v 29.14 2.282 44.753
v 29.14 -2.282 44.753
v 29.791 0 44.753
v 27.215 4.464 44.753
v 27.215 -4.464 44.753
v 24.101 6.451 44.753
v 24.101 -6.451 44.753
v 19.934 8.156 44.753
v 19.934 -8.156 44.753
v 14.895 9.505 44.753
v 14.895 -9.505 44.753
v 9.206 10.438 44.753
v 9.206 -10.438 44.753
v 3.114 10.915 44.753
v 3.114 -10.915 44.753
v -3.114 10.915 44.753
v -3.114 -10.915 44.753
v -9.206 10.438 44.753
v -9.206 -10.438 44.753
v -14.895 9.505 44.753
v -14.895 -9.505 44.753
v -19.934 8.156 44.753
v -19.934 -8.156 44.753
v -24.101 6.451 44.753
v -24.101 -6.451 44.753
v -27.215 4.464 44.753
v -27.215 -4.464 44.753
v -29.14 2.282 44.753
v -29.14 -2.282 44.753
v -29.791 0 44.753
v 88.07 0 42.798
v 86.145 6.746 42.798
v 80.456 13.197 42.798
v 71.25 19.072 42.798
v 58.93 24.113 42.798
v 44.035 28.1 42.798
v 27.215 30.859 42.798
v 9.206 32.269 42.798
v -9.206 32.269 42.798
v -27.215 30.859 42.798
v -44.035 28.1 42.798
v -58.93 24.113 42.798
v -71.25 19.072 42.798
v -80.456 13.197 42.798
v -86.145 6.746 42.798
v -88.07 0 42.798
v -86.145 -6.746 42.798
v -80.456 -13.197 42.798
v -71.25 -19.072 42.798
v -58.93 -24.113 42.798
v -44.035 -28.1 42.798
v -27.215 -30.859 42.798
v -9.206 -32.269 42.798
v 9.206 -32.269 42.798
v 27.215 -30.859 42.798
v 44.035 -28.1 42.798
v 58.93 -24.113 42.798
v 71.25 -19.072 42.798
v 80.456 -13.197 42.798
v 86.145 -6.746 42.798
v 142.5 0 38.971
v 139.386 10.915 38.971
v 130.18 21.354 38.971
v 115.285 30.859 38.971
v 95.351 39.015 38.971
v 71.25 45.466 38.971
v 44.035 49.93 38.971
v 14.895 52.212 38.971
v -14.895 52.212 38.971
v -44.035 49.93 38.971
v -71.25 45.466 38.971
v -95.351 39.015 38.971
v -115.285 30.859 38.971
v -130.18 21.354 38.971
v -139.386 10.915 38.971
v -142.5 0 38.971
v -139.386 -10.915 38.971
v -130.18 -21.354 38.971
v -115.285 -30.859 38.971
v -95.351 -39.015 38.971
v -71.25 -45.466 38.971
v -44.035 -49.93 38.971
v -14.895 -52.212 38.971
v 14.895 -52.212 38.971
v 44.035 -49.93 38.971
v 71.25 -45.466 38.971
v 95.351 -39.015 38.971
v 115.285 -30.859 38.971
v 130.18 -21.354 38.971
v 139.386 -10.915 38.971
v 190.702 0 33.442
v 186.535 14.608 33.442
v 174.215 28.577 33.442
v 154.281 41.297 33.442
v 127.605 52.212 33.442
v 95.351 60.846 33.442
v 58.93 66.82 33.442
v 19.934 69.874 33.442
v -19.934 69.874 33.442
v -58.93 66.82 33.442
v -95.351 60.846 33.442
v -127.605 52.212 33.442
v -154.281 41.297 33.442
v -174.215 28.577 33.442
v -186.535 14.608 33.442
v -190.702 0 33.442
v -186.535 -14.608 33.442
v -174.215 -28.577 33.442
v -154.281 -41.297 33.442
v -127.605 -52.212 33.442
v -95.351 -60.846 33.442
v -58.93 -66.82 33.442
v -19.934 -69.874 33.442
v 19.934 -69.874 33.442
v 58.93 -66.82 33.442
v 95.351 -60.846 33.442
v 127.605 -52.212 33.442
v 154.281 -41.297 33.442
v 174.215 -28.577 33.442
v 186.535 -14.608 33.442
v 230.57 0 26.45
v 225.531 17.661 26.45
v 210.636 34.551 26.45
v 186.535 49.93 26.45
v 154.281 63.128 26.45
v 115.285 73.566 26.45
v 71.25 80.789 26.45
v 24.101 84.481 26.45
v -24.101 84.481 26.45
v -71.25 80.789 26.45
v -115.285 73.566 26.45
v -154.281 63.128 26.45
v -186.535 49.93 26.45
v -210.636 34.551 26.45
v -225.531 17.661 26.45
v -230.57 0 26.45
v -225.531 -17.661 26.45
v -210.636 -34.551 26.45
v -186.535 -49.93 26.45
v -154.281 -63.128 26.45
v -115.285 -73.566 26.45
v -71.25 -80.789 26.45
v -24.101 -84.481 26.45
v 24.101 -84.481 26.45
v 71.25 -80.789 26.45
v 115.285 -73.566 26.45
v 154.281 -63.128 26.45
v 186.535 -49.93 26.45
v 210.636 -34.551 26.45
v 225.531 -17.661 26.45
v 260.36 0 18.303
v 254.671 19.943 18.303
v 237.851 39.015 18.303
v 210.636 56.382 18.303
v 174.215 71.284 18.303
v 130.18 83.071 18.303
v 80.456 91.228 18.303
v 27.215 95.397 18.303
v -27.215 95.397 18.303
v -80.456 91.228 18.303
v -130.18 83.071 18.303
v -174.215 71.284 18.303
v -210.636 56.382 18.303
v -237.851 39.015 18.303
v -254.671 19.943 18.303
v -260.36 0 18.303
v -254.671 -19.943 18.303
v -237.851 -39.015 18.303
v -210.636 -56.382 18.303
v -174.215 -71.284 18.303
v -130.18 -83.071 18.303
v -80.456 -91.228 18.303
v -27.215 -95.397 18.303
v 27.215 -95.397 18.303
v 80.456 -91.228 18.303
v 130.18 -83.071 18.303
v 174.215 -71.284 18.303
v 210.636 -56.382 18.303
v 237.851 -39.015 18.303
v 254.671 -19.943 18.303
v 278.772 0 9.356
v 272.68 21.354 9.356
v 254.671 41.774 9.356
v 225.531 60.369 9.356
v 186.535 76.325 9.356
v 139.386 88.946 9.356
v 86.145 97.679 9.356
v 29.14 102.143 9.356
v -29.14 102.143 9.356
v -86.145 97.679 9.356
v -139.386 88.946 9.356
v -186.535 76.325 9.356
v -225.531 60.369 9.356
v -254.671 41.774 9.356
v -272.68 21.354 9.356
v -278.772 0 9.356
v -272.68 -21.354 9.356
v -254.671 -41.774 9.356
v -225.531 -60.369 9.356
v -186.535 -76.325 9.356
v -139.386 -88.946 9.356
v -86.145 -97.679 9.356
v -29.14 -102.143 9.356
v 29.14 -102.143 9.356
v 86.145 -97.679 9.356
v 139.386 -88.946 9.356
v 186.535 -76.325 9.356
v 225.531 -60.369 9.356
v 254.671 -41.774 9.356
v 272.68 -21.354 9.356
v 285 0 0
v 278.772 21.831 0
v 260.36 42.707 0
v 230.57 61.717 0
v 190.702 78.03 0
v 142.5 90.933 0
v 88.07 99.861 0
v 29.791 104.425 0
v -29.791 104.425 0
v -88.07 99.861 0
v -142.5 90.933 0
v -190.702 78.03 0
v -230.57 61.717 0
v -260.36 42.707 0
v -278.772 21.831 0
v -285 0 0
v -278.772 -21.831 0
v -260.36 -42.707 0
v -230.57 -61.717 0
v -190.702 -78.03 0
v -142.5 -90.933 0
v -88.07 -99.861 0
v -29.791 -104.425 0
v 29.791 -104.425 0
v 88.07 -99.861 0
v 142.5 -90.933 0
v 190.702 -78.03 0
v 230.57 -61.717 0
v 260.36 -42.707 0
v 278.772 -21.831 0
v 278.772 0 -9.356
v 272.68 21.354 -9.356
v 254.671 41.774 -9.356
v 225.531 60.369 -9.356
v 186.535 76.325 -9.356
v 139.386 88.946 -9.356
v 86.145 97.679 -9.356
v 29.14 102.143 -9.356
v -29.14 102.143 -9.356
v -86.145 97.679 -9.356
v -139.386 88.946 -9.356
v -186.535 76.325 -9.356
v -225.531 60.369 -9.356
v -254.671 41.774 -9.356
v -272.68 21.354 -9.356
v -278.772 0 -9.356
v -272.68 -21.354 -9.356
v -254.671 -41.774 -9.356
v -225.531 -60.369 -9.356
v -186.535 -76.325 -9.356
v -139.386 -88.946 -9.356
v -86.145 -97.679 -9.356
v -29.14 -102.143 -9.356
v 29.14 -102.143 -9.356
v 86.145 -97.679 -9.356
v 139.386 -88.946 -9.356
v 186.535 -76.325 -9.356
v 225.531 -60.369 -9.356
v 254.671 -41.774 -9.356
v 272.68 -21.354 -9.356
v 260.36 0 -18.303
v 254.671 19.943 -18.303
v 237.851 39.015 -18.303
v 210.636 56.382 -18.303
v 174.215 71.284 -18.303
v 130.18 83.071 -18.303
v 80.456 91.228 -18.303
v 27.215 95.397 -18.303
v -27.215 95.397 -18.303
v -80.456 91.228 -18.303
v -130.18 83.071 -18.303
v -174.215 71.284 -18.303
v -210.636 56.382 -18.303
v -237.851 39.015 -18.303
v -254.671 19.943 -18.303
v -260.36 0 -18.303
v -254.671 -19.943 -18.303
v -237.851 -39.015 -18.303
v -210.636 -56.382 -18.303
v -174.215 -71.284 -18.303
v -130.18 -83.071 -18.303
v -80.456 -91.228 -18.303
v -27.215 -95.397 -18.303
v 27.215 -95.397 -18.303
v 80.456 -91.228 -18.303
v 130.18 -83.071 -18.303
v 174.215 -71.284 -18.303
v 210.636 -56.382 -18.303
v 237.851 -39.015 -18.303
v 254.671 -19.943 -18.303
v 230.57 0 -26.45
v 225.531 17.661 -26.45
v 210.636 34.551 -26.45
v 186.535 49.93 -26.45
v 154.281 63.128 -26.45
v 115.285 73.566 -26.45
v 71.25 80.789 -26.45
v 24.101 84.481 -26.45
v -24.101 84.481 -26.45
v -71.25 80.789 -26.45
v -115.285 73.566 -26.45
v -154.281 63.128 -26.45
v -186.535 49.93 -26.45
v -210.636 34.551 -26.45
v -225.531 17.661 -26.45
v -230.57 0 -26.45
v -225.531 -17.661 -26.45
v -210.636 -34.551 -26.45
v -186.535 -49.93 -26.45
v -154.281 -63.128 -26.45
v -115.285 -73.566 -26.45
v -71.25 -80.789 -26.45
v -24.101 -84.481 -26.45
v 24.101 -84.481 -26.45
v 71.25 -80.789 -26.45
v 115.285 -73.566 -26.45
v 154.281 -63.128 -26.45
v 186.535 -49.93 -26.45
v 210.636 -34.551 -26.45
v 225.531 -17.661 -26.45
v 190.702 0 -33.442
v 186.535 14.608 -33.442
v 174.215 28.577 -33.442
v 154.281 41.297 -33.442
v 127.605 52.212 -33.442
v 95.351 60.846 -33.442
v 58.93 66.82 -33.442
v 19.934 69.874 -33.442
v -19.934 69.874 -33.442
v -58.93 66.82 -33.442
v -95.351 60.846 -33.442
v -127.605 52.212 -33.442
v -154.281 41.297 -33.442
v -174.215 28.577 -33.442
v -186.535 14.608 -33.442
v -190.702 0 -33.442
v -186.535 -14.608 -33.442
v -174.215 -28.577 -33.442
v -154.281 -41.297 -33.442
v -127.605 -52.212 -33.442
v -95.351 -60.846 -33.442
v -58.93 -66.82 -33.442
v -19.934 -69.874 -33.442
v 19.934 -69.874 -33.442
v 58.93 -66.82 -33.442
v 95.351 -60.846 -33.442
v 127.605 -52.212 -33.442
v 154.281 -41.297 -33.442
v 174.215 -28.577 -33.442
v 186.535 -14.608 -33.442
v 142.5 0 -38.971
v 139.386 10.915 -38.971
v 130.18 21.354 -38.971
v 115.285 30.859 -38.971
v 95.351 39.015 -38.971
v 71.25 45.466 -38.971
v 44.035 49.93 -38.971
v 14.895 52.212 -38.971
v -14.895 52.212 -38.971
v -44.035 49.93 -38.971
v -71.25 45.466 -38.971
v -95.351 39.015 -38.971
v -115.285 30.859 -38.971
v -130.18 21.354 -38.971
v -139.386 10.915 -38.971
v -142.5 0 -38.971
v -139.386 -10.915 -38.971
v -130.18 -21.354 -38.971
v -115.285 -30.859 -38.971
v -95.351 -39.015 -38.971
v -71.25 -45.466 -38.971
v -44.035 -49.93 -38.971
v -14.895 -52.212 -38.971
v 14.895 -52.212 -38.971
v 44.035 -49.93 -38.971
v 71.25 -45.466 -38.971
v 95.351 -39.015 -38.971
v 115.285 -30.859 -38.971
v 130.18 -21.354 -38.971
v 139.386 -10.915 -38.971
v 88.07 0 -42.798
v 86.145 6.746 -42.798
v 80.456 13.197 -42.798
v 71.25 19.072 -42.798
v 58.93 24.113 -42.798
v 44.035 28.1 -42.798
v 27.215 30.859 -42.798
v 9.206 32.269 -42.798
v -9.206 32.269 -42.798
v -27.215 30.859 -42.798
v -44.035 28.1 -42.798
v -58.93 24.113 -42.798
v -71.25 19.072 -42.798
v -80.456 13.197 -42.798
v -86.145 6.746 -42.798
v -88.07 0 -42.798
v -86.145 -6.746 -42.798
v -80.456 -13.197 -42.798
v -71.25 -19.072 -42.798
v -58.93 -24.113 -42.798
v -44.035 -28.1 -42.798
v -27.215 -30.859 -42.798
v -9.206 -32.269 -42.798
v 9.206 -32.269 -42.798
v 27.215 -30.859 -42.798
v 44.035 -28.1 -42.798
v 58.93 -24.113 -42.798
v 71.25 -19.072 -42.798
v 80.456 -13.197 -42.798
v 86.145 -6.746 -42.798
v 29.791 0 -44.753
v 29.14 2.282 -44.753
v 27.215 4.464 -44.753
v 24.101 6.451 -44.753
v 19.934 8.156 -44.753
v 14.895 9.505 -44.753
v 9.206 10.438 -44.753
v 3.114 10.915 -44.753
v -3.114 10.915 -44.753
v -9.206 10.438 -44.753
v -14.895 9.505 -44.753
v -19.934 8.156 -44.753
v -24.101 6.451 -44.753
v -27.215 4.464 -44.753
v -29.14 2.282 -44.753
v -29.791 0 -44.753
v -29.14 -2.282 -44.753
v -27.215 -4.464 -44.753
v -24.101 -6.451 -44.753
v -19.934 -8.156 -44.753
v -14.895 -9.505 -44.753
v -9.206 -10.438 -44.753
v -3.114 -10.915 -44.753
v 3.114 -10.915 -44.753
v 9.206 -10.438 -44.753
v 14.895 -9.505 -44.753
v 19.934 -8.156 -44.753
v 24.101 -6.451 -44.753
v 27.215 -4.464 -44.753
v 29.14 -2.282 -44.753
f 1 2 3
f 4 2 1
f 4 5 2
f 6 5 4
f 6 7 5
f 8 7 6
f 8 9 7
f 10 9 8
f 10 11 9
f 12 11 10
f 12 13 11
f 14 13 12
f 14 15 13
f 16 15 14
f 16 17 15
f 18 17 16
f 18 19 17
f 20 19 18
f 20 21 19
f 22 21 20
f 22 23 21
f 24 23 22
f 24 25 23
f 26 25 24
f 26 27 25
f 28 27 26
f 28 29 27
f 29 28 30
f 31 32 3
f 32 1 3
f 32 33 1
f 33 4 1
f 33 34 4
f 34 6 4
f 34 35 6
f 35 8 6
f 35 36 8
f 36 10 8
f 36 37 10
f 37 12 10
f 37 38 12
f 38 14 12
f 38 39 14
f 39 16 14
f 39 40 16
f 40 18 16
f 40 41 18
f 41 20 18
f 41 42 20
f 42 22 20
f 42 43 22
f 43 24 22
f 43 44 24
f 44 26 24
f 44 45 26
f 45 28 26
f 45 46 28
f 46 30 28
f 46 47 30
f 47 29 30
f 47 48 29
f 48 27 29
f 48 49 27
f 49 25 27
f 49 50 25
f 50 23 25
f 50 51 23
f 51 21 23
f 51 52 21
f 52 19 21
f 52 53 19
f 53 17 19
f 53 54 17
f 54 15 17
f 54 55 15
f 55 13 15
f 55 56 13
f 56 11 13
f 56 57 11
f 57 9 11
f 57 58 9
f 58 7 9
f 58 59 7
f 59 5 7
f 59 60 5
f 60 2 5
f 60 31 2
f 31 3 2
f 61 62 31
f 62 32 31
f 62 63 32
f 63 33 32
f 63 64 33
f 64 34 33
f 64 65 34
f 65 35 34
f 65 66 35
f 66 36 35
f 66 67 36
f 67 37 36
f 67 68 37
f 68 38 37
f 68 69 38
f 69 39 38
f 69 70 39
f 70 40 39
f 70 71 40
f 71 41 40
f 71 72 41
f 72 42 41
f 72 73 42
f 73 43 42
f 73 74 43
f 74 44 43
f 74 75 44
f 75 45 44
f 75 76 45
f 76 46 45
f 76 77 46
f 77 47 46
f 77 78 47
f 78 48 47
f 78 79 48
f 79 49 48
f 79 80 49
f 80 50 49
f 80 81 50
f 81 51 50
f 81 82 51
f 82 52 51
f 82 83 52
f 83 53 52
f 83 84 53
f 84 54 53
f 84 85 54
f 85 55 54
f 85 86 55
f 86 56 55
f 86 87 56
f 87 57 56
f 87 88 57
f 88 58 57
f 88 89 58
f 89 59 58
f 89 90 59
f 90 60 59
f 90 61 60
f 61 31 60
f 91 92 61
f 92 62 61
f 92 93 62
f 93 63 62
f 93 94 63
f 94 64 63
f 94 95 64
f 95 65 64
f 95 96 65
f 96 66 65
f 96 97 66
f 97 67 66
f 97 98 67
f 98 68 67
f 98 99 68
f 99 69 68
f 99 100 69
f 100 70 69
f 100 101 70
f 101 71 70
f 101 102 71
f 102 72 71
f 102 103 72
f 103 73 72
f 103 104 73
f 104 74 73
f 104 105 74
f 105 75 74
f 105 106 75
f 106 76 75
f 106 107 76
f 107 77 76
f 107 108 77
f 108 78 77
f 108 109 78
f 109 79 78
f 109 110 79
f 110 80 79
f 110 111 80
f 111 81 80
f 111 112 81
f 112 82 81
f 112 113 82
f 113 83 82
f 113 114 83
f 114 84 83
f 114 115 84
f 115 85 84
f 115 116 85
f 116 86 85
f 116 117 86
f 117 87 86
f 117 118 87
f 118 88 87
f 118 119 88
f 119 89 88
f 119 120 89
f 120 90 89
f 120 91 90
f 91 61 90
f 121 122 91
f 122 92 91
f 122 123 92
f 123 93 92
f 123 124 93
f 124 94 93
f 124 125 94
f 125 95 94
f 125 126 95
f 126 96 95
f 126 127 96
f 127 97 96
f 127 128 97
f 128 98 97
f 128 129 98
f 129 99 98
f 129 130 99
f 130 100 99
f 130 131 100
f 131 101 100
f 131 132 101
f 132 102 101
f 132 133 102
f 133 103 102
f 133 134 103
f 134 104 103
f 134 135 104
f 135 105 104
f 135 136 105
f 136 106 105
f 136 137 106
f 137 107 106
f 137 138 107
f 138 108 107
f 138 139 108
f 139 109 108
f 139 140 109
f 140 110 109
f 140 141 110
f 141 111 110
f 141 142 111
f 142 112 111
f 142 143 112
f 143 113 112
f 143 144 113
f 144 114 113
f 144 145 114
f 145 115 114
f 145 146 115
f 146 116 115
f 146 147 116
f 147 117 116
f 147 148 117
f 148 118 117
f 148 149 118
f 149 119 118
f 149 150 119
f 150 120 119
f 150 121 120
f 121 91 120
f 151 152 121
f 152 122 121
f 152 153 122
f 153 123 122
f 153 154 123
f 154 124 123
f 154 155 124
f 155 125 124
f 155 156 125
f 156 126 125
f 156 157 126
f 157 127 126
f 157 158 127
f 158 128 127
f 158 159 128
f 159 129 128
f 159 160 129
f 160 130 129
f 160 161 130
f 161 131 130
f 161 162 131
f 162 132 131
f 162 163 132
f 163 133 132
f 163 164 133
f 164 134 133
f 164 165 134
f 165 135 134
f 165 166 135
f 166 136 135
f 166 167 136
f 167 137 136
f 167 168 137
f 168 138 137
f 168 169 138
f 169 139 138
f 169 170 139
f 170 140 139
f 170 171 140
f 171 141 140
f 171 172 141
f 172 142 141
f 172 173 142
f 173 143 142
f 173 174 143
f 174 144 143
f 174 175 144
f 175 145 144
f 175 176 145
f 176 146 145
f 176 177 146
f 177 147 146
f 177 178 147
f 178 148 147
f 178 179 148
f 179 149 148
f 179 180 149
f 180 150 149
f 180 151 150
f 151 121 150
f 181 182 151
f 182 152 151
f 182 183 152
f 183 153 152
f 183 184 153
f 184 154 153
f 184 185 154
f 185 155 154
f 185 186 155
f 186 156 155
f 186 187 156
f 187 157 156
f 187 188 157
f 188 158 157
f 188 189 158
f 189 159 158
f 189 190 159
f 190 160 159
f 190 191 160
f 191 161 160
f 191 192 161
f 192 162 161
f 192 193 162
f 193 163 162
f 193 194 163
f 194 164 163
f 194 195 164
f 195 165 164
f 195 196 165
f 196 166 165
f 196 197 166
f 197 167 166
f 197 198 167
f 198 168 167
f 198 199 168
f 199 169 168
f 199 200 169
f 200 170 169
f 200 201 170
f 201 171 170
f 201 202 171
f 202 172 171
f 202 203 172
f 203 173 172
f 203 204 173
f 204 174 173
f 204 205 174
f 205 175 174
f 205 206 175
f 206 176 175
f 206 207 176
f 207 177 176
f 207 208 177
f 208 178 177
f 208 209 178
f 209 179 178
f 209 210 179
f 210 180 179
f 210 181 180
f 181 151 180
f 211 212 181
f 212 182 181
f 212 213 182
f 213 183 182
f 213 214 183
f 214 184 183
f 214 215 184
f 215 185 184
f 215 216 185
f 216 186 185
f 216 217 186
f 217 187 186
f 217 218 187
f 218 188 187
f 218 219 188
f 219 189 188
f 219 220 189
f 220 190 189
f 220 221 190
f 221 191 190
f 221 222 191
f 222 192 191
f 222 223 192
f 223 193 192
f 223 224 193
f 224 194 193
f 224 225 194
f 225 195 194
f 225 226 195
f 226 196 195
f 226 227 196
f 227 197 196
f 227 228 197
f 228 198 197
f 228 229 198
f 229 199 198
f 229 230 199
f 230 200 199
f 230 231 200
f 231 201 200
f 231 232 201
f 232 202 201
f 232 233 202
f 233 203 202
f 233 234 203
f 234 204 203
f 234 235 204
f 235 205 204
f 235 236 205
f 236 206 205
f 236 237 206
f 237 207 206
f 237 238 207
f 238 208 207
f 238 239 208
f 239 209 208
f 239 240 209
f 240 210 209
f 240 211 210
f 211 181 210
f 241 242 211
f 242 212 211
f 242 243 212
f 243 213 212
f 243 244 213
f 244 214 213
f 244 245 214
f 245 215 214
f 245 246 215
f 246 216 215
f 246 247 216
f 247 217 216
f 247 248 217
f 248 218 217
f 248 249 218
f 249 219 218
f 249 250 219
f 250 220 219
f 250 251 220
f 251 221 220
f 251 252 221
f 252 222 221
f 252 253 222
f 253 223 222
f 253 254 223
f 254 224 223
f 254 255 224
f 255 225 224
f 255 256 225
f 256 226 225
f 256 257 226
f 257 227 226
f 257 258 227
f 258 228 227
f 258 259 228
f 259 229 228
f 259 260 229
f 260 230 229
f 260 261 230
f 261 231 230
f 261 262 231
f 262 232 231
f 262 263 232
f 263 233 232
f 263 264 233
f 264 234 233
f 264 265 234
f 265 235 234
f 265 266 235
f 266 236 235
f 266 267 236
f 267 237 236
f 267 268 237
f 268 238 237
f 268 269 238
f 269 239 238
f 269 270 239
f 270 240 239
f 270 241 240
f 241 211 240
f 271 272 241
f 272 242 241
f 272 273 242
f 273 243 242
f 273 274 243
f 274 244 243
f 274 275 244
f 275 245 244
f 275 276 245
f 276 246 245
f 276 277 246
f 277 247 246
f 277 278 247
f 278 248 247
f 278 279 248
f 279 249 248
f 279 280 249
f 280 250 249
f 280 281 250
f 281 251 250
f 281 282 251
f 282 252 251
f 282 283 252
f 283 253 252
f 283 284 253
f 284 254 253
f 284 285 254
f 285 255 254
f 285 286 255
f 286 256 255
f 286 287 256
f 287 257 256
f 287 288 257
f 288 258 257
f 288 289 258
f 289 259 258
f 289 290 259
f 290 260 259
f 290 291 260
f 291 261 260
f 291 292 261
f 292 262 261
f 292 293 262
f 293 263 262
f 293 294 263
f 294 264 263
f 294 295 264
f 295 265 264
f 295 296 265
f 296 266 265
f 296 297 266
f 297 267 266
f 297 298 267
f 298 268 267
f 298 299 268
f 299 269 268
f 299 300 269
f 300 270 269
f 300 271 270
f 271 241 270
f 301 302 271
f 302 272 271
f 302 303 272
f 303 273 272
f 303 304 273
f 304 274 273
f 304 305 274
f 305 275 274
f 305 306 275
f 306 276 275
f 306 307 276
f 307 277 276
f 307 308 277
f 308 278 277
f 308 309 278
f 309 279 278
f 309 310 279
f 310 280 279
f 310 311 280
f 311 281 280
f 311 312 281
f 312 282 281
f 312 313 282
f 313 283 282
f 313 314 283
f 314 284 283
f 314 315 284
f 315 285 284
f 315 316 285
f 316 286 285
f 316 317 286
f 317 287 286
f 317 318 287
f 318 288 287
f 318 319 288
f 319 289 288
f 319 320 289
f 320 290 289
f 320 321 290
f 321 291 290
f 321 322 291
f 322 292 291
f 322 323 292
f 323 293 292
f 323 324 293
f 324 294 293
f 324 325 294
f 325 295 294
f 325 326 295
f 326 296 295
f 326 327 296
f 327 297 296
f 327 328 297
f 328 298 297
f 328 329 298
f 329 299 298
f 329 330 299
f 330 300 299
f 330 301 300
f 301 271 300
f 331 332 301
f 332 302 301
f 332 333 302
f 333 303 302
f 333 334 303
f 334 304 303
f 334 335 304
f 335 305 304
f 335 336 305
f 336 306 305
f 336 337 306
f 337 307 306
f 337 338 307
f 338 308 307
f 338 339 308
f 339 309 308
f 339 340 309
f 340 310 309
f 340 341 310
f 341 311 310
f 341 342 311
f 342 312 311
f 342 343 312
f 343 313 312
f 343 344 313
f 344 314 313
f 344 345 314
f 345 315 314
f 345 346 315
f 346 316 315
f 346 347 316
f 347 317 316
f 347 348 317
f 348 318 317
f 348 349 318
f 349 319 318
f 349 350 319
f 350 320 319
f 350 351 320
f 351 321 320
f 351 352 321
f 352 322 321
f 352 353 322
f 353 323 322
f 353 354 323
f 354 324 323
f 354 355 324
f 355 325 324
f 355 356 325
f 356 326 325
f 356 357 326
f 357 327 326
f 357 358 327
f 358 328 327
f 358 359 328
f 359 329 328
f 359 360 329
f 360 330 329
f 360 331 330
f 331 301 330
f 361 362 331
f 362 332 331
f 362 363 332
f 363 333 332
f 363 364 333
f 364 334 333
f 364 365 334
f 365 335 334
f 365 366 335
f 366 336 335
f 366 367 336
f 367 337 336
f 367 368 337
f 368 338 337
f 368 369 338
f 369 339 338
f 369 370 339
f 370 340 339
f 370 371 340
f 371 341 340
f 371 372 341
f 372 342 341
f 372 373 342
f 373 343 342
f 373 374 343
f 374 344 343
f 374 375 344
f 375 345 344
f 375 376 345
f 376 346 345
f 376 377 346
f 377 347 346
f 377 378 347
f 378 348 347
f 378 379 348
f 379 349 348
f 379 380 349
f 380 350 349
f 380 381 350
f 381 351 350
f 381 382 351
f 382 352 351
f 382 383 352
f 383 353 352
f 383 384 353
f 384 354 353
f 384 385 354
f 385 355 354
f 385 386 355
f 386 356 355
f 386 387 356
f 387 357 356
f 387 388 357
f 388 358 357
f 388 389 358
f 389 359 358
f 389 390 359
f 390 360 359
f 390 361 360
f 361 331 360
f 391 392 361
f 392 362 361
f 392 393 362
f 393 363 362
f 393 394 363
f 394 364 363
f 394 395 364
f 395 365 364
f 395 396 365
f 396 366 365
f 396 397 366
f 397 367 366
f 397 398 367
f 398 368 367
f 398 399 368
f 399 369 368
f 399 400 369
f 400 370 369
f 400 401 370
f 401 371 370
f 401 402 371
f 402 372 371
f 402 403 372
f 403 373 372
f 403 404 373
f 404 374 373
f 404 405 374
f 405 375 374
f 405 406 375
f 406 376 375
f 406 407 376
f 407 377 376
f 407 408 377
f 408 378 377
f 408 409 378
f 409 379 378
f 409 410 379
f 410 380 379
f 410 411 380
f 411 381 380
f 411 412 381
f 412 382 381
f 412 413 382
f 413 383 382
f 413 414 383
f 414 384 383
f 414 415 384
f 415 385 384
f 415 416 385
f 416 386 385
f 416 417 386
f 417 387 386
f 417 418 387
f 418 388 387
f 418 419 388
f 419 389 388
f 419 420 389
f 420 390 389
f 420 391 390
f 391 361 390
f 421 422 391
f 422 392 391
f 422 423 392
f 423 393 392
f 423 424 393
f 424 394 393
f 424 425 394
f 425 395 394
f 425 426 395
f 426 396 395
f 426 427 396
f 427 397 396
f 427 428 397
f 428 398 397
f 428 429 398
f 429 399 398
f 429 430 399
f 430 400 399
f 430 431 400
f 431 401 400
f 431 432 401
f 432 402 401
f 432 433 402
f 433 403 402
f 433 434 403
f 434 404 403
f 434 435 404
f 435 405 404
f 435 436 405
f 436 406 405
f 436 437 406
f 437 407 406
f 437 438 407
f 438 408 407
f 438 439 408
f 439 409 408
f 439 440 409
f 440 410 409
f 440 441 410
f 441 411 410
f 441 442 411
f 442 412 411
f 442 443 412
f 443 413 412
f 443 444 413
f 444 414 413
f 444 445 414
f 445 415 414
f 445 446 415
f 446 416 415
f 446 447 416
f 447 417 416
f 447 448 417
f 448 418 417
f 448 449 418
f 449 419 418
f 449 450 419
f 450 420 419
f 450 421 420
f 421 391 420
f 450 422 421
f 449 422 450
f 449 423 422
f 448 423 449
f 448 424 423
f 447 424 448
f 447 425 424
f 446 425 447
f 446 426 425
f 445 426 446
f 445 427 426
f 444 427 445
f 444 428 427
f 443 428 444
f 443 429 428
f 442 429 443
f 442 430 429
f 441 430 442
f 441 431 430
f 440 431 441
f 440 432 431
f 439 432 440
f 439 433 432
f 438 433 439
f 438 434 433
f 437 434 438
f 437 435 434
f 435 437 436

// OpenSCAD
// Generated by SolidPython 1.0.1 on 2020-07-29 00:46:53


scale(v = [19, 7, 3]) {
	sphere(r = 15);
}
/***********************************************
*********      SolidPython code:      **********
************************************************
 
# import packages: SolidPython
from solid import *
from solid.utils import *
from itertools import chain, combinations, permutations


class Resize:

    def __init__(self, scad_file):
        self.scad_file = scad_file
        #self.scad_file = import_scad(scad_file)
        # cone/cylinder param:
        self.r1 = 0
        self.r2 = 0
        self.h = 0
        # rectangular prism param:
        self.w = 0
        self.l = 0
        # ellipse param:
        self.r = 0

    # import OpenScad code (file name corresponds to shape)


    # classify shape + parameters
    def assign(self, param1, param2, param3):
        if self.scad_file == 'cone.scad':
            self.r1 = param1
            self.r2 = param2
            self.h = param3
        elif self.scad_file == 'cylinder.scad':
            self.r1 = param1
            self.r2 = param2
            self.h = param3
        elif self.scad_file == 'rectangularPrism.scad':
            self.h = param1
            self.l = param2
            self.w = param3
        else:
            self.r = param1
            self.h = param2

    # resize parameters
    def iterate(self):
        x = range(3, 20, 2)
        i = 1
        if self.scad_file == 'cone.scad':
            tempList = list(permutations(x, 2))
            for temp in tempList:
                param1 = temp[0]
                param2 = temp[1]
                filepath = 'produced_scad_files/' + 'cone' + str(param1) + '_' + str(param2) + '_' + '.scad'
                scad_render_to_file(cylinder(h=param1, r1=param2, r2=0), filepath)

        elif self.scad_file == 'cylinder.scad':
            tempList = list(permutations(x, 3))
            for temp in tempList:
                param1 = temp[0]
                param2 = temp[1]
                filepath = 'produced_scad_files/' + 'cylinder' + str(param1) + '_' + str(param2) + '_' + '.scad'
                scad_render_to_file(cylinder(h=param1, r1=param2, r2=param2), filepath)

        elif self.scad_file == 'rectangularPrism.scad':
            tempList = list(permutations(x, 3))
            for temp in tempList:
                param1 = temp[0]
                param2 = temp[1]
                param3 = temp[2]
                filepath = 'produced_scad_files/' + 'rectangularPrism' + str(param1) + '_' + str(param2) + '_' + str(
                    param3) + '.scad'
                scad_render_to_file(cube(size=(param1, param2, param3)), filepath)

        elif self.scad_file == 'ellipse.scad':
            tempList = list(permutations(x, 4))
            for temp in tempList:
                param1 = temp[0]
                param2 = temp[1]
                param3 = temp[2]
                param4 = temp[3]
                filepath = 'produced_scad_files/' + 'ellipse' + str(param1) + '_' + str(param2) + '_' + str(param3) + '_' + str(param4) + '.scad'
                scad_render_to_file(scale([param1, param2, param3])(sphere(r=param4)), filepath)

    def render_to_scadfile(self):
        scad_render_to_file(scad, 'example.scad') 
 
************************************************/
